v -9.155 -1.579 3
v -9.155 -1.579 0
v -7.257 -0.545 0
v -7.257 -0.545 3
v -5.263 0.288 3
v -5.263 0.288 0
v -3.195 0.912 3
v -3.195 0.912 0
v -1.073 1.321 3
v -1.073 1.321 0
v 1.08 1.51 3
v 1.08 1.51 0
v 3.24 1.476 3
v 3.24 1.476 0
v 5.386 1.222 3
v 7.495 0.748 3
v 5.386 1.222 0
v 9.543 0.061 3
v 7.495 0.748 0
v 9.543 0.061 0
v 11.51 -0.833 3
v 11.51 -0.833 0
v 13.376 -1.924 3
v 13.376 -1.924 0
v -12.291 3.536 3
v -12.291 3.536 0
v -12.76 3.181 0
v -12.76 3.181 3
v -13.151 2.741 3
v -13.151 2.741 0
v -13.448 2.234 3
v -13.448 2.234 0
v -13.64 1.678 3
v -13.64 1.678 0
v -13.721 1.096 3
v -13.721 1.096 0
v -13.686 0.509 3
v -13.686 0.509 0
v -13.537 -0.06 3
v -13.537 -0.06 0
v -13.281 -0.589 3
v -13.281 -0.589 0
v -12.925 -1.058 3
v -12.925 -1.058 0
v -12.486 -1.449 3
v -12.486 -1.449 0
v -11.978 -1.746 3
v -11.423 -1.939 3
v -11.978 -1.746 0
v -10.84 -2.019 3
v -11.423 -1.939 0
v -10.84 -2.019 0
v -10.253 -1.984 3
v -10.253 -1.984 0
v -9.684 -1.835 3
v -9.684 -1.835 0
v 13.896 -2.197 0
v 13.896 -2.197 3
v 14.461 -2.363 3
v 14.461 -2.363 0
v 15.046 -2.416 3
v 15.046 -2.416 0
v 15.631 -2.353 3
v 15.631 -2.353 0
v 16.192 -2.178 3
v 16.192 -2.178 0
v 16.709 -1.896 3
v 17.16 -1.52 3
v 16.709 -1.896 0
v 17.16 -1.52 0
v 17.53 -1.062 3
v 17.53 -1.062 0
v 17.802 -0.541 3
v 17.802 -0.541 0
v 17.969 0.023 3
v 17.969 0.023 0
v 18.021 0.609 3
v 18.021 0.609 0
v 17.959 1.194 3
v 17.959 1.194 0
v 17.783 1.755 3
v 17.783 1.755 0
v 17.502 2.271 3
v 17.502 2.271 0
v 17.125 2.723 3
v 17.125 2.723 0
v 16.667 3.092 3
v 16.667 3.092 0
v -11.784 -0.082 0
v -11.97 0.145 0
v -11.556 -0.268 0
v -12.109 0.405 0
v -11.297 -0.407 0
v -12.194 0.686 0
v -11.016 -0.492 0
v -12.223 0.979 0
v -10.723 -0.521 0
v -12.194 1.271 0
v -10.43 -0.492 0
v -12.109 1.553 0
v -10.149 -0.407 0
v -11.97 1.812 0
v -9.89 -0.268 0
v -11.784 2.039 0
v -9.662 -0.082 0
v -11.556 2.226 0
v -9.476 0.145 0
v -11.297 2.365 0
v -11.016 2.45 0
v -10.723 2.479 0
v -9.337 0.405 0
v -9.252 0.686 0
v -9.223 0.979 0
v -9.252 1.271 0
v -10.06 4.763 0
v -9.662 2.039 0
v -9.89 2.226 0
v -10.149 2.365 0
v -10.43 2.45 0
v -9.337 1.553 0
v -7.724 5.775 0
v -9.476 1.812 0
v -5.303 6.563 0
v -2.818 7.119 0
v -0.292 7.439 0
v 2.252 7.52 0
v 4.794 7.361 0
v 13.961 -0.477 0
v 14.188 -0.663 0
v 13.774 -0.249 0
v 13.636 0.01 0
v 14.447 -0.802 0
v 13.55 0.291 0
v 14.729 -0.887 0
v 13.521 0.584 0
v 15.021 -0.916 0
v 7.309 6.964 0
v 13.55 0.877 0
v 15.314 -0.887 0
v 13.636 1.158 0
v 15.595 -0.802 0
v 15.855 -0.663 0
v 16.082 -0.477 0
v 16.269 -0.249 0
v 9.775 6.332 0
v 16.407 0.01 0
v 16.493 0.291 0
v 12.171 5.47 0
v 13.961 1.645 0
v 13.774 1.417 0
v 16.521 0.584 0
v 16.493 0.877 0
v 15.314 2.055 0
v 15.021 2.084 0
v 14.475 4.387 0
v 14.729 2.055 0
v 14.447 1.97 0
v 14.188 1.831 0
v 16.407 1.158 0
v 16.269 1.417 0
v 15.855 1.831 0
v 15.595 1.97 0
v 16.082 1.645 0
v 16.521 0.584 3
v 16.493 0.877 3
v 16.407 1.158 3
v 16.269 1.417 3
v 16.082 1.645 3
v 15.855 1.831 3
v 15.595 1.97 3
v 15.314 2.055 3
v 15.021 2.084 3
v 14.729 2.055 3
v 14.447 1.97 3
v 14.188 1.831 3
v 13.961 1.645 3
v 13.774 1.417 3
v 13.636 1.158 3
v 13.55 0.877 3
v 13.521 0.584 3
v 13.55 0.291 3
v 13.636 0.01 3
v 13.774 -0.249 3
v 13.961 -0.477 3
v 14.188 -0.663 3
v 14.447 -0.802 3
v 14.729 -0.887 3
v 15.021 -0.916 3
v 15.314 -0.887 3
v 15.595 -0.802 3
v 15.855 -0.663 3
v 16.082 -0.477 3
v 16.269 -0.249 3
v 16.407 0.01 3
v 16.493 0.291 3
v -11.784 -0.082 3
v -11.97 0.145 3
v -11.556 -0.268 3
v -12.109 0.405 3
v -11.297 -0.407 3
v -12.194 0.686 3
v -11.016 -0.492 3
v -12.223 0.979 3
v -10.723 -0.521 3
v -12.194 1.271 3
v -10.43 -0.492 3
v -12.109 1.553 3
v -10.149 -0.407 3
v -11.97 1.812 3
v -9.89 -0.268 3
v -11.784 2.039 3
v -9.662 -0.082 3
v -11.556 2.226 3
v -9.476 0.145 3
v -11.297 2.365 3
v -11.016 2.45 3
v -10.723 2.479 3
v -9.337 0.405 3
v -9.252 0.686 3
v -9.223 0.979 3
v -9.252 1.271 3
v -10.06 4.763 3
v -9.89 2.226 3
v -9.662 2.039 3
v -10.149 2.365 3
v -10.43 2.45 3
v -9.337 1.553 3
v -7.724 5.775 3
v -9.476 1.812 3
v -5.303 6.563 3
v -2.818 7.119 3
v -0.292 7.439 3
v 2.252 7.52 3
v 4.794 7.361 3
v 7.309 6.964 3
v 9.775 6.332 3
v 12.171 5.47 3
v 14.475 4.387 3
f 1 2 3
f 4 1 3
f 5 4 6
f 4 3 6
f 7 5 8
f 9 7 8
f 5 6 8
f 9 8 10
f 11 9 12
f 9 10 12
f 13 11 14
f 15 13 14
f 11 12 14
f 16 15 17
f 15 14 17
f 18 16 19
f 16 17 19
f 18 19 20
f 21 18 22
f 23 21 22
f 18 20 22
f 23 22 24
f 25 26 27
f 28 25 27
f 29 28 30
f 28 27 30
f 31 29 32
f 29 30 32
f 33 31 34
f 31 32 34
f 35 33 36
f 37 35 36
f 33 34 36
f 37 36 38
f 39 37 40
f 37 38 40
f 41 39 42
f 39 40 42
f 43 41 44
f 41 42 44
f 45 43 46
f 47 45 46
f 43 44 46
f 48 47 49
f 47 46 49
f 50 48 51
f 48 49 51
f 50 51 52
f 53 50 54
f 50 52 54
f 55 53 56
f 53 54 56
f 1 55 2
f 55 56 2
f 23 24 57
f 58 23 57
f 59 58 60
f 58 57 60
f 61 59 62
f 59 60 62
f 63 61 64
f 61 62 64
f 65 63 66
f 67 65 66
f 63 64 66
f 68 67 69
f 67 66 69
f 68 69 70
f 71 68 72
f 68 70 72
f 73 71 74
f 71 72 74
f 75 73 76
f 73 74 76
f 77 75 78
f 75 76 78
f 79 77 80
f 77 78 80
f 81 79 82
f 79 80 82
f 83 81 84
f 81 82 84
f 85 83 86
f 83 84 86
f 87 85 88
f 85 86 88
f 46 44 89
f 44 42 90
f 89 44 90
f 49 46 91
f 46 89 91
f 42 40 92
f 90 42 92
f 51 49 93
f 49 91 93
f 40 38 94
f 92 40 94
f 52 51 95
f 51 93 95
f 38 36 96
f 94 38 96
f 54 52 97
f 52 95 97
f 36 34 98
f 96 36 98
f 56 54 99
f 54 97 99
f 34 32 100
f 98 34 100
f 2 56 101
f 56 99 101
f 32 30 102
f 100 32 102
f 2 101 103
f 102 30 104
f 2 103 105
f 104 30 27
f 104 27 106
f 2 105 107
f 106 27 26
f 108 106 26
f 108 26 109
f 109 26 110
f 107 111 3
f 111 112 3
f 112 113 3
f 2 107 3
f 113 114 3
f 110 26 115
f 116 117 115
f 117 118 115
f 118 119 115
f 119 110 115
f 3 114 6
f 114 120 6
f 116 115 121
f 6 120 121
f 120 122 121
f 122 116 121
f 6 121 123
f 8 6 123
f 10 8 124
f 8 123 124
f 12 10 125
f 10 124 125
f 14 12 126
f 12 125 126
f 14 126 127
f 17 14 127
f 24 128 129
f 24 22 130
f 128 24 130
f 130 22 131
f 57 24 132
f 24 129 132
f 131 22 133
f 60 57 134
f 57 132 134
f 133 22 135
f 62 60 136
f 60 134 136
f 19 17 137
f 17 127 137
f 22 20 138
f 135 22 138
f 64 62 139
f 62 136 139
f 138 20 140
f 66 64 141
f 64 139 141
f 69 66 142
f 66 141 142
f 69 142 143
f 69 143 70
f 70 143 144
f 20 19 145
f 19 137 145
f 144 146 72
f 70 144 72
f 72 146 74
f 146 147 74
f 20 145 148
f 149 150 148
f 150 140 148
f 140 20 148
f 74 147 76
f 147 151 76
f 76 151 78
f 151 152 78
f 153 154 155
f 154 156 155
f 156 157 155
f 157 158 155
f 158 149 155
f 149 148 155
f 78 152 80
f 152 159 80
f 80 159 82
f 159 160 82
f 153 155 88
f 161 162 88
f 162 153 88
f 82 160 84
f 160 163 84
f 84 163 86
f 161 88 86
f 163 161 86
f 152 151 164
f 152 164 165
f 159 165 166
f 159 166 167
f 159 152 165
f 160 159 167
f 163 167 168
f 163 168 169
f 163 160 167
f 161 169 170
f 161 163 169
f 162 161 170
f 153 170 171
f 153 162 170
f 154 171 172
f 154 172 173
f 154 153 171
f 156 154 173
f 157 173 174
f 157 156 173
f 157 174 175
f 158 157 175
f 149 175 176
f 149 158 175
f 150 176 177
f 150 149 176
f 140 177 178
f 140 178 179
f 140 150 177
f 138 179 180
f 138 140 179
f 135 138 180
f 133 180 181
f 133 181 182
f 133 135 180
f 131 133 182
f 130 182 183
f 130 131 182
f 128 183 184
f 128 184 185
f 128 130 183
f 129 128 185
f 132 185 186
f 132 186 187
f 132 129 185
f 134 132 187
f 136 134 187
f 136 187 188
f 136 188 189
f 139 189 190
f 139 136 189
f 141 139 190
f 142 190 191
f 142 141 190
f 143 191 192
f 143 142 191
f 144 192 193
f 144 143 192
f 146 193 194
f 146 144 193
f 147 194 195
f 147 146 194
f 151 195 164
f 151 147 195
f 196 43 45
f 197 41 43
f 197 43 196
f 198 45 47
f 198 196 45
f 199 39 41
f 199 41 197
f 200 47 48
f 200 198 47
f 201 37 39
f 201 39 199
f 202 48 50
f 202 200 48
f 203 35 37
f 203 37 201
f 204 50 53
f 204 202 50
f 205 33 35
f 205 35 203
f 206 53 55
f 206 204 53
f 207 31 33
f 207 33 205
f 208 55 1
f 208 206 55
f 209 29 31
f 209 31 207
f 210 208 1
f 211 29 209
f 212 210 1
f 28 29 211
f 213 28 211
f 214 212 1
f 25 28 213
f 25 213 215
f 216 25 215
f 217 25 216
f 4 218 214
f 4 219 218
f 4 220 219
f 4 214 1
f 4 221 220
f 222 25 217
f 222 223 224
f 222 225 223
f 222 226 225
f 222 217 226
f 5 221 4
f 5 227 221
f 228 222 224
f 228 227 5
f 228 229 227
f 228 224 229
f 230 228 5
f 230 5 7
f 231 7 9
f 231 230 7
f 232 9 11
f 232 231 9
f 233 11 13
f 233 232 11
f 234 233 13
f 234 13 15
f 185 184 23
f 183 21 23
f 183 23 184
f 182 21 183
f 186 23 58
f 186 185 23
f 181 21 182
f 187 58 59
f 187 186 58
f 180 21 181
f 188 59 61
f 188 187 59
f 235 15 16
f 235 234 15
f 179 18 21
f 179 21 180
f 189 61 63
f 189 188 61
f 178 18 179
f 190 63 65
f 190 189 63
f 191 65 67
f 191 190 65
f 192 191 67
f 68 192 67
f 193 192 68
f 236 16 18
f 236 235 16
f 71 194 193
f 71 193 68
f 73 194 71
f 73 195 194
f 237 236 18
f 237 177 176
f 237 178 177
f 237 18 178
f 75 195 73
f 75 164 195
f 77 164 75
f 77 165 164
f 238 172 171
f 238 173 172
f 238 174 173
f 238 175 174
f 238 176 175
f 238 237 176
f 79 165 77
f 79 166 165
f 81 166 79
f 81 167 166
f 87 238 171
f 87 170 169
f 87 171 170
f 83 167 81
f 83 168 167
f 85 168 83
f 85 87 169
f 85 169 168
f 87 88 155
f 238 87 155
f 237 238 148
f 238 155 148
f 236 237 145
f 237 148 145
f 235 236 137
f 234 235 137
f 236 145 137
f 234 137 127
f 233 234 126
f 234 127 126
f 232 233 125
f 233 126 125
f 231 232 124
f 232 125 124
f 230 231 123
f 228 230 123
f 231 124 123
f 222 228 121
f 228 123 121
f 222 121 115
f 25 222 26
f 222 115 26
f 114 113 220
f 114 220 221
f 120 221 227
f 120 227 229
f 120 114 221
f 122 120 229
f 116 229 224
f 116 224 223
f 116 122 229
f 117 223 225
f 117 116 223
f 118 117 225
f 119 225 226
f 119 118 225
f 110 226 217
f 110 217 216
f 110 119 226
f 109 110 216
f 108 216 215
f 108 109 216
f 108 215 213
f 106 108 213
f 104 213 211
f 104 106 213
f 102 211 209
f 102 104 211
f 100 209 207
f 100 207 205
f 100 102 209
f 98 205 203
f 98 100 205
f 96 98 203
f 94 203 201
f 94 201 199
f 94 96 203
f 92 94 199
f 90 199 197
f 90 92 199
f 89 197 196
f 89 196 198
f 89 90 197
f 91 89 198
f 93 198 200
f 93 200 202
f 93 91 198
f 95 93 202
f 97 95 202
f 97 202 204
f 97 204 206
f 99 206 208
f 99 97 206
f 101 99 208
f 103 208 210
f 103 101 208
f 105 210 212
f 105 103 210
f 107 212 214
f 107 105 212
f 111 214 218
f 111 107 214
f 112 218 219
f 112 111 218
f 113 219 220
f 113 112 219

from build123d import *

# Parameters (mm, degrees)
SKETCH1_R           = 1.5
BOSS_EXTRUDE1_DEPTH = 3


with BuildPart() as part:
    # Sketch1 → Boss-Extrude1 (new body)
    with BuildSketch(Plane.XY):
        with BuildLine():
            ThreePointArc((16.667258487, 3.092264578), (2.252499278, 7.520108125), (-12.291231068, 3.536267122))
            ThreePointArc((-12.291231068, 3.536267122), (-13.280504589, -0.589425292), (-9.154812174, -1.578698813))
            ThreePointArc((-9.154812174, -1.578698813), (2.160515814, 1.520813246), (13.375501545, -1.924142128))
            ThreePointArc((13.375501545, -1.924142128), (17.529583369, -1.061817246), (16.667258487, 3.092264578))
        make_face()
        with Locations((-10.723021621, 0.978784155)):
            Circle(SKETCH1_R, mode=Mode.SUBTRACT)
        with Locations((15.021380016, 0.584061225)):
            Circle(SKETCH1_R, mode=Mode.SUBTRACT)
    extrude(amount=BOSS_EXTRUDE1_DEPTH)


solid = part.part
